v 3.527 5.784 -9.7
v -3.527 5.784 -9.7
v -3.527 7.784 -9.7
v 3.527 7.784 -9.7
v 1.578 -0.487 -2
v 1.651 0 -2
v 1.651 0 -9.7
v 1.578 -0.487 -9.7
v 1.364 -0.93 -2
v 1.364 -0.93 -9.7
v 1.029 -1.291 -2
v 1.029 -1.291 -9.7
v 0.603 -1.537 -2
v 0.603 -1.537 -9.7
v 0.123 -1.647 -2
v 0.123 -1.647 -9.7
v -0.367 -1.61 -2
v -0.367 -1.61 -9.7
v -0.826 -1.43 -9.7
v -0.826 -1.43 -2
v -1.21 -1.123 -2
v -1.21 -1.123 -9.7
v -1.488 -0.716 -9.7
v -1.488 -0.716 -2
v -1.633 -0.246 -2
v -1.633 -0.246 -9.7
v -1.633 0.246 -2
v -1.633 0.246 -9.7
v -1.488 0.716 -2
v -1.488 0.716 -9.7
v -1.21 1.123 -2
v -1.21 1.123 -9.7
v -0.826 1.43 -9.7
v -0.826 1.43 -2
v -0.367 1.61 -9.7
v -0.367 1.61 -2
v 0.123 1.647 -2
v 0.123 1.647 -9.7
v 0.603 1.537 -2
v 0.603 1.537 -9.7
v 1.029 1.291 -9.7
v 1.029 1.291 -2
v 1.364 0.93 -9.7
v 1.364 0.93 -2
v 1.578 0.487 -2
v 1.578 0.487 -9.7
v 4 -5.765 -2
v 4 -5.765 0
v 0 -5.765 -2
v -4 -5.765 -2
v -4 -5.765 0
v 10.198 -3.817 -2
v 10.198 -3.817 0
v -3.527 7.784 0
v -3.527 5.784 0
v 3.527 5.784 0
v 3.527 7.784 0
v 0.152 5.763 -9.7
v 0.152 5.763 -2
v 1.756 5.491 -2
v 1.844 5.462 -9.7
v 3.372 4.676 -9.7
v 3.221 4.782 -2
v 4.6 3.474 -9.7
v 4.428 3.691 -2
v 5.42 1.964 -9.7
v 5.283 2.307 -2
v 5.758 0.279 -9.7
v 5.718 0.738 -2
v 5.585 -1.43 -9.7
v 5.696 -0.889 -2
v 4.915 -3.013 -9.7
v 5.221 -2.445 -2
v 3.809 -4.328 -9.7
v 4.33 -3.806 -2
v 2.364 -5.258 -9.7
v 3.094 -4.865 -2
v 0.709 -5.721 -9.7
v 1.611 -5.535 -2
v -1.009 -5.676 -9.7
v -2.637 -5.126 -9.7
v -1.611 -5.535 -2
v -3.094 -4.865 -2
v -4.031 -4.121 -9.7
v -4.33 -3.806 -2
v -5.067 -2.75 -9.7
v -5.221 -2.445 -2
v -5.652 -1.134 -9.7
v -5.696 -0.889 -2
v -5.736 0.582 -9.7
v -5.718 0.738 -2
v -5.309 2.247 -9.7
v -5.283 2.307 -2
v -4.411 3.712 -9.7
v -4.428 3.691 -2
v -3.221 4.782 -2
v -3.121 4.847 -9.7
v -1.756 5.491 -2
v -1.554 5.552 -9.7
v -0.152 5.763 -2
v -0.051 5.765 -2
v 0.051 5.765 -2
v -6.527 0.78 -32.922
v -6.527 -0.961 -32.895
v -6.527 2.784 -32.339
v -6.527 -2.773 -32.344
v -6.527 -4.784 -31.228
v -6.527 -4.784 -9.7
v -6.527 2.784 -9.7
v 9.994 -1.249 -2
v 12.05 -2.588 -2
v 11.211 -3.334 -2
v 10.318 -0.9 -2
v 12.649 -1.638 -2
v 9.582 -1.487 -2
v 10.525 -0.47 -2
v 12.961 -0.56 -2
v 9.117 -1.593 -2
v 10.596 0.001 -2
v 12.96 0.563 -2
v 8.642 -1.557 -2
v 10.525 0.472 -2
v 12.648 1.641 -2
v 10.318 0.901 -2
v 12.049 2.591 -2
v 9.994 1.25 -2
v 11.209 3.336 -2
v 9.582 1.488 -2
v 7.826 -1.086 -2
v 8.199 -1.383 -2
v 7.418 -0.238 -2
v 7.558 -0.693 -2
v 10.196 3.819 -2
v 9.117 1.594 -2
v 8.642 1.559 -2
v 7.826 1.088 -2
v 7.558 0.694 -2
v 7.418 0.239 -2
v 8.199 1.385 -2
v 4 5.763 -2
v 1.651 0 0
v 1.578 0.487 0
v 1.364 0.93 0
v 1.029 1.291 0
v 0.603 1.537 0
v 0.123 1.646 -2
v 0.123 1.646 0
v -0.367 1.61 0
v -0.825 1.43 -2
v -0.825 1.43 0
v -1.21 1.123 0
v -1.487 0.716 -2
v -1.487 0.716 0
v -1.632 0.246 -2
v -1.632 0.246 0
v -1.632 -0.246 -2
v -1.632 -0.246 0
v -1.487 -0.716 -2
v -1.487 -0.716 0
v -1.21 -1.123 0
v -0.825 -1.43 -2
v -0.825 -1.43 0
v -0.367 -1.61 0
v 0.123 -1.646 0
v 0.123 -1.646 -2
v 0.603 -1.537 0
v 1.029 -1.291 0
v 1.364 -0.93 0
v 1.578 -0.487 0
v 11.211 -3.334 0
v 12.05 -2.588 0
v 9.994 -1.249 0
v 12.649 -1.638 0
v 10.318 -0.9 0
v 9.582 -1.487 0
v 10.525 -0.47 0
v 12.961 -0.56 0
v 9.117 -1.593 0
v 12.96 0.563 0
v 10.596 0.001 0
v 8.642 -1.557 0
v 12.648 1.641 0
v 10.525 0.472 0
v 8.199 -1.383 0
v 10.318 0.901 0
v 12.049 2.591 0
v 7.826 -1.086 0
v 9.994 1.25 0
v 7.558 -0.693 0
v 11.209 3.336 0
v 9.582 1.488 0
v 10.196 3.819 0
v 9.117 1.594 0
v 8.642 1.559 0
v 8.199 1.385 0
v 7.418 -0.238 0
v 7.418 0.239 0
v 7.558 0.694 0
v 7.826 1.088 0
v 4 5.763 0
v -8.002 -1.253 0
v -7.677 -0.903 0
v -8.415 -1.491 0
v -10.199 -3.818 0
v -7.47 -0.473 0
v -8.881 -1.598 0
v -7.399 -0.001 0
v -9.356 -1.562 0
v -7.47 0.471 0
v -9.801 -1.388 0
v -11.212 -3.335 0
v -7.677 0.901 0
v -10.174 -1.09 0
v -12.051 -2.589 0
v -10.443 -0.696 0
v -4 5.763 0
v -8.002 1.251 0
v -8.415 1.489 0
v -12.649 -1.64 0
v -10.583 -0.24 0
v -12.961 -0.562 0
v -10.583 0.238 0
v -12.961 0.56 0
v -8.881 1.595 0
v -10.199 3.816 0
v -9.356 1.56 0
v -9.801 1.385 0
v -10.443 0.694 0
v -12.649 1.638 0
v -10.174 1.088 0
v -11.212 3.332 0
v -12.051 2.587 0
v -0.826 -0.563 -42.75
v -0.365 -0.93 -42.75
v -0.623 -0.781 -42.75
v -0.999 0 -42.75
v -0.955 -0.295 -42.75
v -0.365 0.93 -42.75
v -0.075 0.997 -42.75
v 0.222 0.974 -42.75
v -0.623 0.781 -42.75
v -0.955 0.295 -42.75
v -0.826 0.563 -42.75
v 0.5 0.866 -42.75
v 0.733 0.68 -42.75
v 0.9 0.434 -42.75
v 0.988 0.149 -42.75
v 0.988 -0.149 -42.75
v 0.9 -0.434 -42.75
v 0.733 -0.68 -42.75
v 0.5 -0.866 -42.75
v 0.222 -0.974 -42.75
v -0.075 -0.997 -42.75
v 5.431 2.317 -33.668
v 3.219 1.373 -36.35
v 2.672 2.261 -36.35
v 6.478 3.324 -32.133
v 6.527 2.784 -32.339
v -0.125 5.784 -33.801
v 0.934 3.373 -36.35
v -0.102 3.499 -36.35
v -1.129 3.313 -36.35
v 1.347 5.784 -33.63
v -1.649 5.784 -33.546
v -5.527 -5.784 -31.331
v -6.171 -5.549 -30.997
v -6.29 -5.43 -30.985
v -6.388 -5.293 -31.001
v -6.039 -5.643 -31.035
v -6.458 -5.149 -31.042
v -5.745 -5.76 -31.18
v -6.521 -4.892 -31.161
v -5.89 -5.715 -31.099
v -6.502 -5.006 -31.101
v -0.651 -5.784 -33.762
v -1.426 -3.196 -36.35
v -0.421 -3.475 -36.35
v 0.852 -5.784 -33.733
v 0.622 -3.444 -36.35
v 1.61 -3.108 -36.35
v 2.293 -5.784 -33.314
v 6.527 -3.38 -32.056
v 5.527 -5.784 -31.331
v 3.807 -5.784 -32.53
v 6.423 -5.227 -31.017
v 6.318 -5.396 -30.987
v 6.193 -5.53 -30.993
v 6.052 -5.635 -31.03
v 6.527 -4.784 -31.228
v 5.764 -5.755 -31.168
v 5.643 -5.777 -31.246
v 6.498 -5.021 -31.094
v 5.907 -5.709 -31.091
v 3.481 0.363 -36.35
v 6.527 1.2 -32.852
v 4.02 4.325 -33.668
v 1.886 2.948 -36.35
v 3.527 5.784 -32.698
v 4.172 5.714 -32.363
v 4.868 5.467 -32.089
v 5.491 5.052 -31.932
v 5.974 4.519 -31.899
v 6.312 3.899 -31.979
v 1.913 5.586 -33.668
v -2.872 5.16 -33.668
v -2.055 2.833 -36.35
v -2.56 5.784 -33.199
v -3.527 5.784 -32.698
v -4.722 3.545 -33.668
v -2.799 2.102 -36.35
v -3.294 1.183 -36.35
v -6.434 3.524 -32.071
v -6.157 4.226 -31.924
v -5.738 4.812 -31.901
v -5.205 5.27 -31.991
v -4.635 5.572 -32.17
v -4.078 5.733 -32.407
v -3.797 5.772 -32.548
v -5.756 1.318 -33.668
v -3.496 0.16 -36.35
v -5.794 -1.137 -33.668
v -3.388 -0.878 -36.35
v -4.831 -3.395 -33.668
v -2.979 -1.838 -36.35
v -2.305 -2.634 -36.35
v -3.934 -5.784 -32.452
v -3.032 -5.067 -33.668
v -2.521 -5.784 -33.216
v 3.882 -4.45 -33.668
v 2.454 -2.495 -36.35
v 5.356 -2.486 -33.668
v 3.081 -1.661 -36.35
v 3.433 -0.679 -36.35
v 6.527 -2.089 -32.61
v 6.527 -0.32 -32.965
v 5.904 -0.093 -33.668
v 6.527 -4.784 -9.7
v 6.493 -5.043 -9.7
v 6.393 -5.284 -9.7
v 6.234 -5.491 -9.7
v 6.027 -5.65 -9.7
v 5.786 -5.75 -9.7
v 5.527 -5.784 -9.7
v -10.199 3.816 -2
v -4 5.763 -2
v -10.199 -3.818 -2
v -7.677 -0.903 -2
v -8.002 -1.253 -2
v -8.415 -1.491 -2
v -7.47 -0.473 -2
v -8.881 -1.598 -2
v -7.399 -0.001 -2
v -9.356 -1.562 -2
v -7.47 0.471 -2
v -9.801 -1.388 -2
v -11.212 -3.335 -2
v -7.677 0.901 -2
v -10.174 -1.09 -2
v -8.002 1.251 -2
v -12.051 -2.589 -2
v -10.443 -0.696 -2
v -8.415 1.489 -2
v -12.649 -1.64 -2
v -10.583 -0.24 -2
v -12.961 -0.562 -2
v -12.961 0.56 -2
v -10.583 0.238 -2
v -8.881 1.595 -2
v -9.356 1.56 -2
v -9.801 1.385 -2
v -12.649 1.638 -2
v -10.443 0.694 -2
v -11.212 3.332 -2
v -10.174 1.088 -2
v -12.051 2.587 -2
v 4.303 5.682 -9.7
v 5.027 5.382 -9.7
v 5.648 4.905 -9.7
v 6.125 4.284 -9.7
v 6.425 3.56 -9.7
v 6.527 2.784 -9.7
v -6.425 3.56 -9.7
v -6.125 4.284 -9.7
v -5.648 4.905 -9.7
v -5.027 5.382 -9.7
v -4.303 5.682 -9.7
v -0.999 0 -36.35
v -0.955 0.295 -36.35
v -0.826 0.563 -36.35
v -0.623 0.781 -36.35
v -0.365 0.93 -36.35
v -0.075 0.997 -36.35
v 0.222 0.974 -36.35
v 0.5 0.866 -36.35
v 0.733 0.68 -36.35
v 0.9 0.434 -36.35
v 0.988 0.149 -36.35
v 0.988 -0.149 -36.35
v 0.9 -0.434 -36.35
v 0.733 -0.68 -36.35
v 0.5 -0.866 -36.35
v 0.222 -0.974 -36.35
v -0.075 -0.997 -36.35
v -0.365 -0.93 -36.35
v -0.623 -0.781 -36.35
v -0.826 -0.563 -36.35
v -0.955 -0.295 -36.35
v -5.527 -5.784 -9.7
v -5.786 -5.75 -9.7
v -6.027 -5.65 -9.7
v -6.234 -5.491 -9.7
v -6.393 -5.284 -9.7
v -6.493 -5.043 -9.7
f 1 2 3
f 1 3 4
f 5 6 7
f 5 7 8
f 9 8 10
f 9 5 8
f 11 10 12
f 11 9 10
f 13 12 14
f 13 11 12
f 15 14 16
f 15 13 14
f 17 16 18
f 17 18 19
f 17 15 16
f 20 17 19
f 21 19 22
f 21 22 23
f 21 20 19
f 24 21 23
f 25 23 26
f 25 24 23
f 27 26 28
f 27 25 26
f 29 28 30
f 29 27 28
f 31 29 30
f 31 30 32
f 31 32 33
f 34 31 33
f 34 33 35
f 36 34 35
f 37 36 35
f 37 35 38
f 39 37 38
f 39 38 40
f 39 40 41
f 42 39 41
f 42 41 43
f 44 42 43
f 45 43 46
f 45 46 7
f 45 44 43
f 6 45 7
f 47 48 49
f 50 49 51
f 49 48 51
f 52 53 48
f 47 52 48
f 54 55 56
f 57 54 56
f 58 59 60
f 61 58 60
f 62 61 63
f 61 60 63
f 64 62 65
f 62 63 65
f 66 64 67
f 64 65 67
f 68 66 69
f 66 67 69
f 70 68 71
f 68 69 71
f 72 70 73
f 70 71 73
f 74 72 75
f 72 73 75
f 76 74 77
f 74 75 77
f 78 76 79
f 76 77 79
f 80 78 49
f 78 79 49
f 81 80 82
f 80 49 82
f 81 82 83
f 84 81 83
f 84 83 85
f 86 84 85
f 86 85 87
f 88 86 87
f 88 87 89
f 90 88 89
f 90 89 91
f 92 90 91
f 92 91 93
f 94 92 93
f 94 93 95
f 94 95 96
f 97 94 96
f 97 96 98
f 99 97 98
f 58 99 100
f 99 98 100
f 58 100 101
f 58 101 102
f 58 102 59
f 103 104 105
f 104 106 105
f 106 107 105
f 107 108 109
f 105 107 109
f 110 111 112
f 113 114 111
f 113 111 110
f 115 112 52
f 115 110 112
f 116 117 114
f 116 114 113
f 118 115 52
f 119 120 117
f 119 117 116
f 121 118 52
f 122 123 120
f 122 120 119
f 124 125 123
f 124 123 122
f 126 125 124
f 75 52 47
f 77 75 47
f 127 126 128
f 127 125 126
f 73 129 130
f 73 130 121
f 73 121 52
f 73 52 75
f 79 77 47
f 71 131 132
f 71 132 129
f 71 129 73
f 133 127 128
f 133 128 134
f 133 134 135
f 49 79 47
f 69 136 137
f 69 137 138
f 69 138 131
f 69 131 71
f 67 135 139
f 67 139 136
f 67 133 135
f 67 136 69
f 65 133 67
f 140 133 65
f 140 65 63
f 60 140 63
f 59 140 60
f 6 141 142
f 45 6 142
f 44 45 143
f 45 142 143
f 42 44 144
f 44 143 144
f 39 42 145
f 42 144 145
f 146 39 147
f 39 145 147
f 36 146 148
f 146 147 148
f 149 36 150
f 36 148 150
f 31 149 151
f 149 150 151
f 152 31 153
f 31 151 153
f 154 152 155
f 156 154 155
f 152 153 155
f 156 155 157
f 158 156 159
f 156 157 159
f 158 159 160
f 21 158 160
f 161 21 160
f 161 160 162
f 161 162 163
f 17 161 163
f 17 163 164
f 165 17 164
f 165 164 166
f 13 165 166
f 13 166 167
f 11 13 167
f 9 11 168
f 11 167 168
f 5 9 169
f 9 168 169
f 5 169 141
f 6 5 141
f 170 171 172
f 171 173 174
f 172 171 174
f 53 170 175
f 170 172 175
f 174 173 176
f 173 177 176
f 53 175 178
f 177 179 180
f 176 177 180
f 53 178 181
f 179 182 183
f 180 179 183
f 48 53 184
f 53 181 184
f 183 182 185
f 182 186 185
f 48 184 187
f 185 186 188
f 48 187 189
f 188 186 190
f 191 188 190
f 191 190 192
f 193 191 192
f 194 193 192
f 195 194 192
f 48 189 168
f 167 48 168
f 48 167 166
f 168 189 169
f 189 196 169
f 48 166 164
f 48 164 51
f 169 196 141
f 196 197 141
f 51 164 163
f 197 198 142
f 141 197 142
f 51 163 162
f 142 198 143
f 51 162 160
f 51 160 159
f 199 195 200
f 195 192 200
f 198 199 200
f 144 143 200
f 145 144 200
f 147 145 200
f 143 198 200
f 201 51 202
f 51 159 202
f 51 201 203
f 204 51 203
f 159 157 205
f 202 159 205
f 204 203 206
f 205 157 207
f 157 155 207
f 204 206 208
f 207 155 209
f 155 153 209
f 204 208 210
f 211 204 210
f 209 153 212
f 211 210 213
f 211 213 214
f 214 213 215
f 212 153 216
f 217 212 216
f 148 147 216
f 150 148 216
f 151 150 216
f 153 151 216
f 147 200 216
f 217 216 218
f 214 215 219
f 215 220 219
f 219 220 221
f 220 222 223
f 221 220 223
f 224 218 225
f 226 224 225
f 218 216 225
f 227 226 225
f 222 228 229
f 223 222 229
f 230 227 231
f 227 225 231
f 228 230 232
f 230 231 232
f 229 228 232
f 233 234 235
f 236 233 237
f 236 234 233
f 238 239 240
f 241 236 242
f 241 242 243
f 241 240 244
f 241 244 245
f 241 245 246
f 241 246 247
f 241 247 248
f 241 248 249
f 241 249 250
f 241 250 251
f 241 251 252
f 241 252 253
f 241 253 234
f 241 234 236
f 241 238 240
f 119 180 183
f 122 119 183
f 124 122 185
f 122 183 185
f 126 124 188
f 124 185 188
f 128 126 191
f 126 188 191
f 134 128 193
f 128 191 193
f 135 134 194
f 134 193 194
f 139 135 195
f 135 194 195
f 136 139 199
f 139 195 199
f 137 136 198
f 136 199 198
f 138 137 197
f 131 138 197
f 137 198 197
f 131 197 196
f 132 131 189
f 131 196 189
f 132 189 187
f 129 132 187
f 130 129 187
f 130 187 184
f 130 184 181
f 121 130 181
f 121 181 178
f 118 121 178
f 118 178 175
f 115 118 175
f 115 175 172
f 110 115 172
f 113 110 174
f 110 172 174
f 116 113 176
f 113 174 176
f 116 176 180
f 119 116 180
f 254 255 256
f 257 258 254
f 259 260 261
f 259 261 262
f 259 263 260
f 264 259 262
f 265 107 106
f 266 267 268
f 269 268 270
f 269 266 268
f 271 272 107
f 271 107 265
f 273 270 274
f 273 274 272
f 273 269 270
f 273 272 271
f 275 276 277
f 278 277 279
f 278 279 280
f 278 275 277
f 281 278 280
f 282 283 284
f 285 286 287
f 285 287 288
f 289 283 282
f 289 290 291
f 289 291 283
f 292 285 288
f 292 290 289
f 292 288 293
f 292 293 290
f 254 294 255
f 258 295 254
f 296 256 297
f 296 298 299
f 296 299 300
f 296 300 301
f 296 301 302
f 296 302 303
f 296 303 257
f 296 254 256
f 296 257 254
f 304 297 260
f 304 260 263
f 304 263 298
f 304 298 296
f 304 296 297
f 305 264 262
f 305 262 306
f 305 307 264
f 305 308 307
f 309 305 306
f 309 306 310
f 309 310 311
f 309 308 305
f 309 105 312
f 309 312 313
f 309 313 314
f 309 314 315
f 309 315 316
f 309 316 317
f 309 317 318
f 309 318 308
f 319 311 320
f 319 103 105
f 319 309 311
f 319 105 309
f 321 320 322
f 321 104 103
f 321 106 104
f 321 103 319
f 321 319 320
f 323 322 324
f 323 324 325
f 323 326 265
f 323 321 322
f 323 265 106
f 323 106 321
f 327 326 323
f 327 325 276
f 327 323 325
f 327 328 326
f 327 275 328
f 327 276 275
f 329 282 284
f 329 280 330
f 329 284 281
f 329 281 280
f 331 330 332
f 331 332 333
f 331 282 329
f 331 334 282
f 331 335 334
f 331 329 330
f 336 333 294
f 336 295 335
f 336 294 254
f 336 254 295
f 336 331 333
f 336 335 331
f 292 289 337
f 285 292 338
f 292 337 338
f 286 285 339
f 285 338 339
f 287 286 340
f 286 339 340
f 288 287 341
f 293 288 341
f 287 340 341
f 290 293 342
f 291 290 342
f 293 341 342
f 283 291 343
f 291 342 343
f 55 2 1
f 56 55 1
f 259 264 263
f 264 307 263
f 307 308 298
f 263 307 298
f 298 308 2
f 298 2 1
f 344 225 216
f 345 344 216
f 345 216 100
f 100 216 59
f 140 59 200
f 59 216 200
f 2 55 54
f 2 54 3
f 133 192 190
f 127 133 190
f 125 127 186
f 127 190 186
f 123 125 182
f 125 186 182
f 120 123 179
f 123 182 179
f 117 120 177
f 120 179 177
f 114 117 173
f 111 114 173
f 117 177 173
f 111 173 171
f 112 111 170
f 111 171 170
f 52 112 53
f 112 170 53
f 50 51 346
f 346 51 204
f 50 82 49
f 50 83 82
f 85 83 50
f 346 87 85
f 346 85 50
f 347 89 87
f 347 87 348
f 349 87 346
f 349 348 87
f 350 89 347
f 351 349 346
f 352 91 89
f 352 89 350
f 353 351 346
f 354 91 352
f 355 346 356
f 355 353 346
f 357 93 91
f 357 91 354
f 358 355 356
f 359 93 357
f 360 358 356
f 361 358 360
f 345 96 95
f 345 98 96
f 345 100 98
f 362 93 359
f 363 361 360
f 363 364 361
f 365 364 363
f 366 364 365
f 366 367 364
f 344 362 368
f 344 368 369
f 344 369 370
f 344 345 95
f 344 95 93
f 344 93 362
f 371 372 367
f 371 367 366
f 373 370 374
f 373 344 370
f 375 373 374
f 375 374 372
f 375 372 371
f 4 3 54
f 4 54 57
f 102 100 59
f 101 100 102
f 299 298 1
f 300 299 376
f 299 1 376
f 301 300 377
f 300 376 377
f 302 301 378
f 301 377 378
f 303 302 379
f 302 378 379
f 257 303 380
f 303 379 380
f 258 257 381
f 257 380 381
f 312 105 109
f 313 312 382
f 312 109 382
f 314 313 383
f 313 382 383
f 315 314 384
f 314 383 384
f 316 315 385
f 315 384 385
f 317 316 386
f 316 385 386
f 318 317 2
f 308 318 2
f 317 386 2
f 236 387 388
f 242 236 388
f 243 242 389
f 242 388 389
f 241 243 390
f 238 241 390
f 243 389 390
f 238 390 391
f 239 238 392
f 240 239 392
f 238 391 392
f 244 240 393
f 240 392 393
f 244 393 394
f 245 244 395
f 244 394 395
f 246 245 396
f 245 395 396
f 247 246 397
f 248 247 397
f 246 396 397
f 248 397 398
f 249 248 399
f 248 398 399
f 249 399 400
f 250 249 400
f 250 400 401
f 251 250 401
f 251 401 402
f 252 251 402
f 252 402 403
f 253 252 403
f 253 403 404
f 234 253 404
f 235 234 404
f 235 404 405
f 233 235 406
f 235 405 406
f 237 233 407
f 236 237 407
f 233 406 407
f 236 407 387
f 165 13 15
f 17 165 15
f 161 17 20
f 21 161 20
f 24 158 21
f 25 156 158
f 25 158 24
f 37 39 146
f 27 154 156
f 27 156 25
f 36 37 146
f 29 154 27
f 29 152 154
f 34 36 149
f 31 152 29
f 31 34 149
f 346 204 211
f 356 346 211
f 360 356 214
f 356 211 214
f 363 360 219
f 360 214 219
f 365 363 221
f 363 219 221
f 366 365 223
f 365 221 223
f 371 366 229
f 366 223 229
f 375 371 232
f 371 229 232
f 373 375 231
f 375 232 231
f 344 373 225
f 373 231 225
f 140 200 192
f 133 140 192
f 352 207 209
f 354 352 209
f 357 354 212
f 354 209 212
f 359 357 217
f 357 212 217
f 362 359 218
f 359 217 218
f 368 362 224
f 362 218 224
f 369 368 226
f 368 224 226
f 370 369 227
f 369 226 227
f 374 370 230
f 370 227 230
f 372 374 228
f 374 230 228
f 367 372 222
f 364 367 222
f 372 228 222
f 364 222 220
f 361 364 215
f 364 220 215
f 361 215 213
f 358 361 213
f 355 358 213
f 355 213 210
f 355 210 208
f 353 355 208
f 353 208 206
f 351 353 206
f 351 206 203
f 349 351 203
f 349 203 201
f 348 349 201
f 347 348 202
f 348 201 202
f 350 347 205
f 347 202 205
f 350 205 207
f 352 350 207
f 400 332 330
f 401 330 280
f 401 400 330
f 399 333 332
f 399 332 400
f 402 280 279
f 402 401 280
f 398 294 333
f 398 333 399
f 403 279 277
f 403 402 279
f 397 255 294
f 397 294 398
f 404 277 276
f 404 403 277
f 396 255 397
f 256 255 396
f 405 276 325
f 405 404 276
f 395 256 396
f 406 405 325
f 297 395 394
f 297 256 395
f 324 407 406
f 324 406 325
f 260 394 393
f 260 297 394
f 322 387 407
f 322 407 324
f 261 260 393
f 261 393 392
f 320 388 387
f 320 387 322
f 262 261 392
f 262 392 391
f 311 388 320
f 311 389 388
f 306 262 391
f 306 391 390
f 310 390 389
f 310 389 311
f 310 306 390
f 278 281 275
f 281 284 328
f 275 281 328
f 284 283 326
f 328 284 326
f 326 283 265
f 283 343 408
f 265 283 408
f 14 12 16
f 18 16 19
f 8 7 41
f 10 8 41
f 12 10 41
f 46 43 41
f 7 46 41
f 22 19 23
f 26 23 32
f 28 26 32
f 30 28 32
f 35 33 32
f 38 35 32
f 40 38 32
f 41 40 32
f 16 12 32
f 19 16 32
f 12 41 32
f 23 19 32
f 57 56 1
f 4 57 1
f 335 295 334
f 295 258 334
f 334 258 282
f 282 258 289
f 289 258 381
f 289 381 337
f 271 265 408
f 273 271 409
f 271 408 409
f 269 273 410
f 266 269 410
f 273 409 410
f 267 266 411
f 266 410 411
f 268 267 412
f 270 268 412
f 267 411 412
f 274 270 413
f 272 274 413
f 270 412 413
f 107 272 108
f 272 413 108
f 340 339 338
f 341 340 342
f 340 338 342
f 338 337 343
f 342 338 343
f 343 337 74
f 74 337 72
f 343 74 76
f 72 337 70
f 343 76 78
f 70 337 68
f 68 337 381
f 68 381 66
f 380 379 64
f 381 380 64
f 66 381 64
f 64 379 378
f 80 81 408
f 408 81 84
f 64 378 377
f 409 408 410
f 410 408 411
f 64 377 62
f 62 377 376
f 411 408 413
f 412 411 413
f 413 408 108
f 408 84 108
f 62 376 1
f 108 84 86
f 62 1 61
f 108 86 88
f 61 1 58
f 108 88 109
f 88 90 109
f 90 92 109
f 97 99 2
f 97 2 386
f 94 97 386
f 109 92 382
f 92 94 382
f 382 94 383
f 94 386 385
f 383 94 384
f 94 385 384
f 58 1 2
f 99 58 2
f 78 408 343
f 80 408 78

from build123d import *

# Parameters (mm, degrees)
CROQUIS1_R               = 1.598160281
CROQUIS1_R_2             = 1.600993429
CROQUIS1_R_3             = 1.650918845
SALIENTE_EXTRUIR7_DEPTH  = 2
CROQUIS2_R               = 5.764999893
CROQUIS2_R_2             = 1.651186543
SALIENTE_EXTRUIR8_DEPTH  = 7.7
SALIENTE_EXTRUIR9_DEPTH  = 26.65
CROQUIS6_R               = 0.999415005
SALIENTE_EXTRUIR10_DEPTH = 6.4
CROQUIS7_W               = 7.053736916
CROQUIS7_H               = 9.7
SALIENTE_EXTRUIR11_DEPTH = 2


with BuildPart() as part:
    # Croquis1 → Saliente-Extruir7 (new body)
    with BuildSketch(Plane.XY):
        with BuildLine():
            Line((4.00000019, 5.763000809), (10.195969576, 3.8191034))
            ThreePointArc((10.195969576, 3.8191034), (12.999977706, 0.001566069), (10.197782, -3.817301838))
            Line((10.197782, -3.817301838), (4.00000019, -5.764999893))
            Line((4.00000019, -5.764999893), (-4.00000019, -5.764999893))
            Line((-4.00000019, -5.764999893), (-10.199065979, -3.817665654))
            ThreePointArc((-10.199065979, -3.817665654), (-13.000622723, -0.001109837), (-10.199143851, 3.815503142))
            Line((-10.199143851, 3.815503142), (-4.00000019, 5.763000809))
            Line((-4.00000019, 5.763000809), (4.00000019, 5.763000809))
        make_face()
        with Locations((8.997973452, 0.000616233)):
            Circle(CROQUIS1_R, mode=Mode.SUBTRACT)
        with Locations((-9.000145119, -0.001069025)):
            Circle(CROQUIS1_R_2, mode=Mode.SUBTRACT)
        Circle(CROQUIS1_R_3, mode=Mode.SUBTRACT)
    extrude(amount=-SALIENTE_EXTRUIR7_DEPTH)

    # Croquis2 → Saliente-Extruir8 (add)
    with BuildSketch(Plane(origin=(0, 0, -2), x_dir=(-1, 0, 0), z_dir=(0, 0, -1))):
        with Locations(Location((0, 0, 0), (0, 0, 91.508919394))):
            Circle(CROQUIS2_R)
        with Locations(Location((0, 0, 0), (0, 0, 180))):
            Circle(CROQUIS2_R_2, mode=Mode.SUBTRACT)
    extrude(amount=SALIENTE_EXTRUIR8_DEPTH)

    # Croquis3 → Saliente-Extruir9 (add)
    with BuildSketch(Plane(origin=(0, 0, -9.7), x_dir=(-1, 0, 0), z_dir=(0, 0, -1))):
        with BuildLine():
            Line((3.526868458, 5.783774708), (-3.526868458, 5.783774708))
            ThreePointArc((-3.526868458, 5.783774708), (-5.648188802, 4.905095052), (-6.526868458, 2.783774708))
            Line((-6.526868458, 2.783774708), (-6.526868458, -4.783774708))
            ThreePointArc((-6.526868458, -4.783774708), (-6.233975239, -5.490881489), (-5.526868458, -5.783774708))
            Line((-5.526868458, -5.783774708), (5.526868458, -5.783774708))
            ThreePointArc((5.526868458, -5.783774708), (6.233975239, -5.490881489), (6.526868458, -4.783774708))
            Line((6.526868458, -4.783774708), (6.526868458, 2.783774708))
            ThreePointArc((6.526868458, 2.783774708), (5.648188802, 4.905095052), (3.526868458, 5.783774708))
        make_face()
    extrude(amount=SALIENTE_EXTRUIR9_DEPTH)

    # Croquis5 → Cortar-Revolución1 (revolve, cut)
    with BuildSketch(Plane(origin=(0, 0, 0), x_dir=(1, 0, 0), z_dir=(0, 1, 0)), mode=Mode.PRIVATE) as cortar_revoluci_n1_sk:
        Polygon((-3.5, 36.35), (-8.472559386, 30.803521887), (-8.472559386, 36.35), align=None)
    revolve(cortar_revoluci_n1_sk.sketch.rotate(Axis((0, 0, -39.9199001), (0, 0, 1)), 203.098732749), axis=Axis((0, 0, -39.9199001), (0, 0, 1)), mode=Mode.SUBTRACT)

    # Croquis6 → Saliente-Extruir10 (add)
    with BuildSketch(Plane(origin=(0, 0, -36.35), x_dir=(-1, 0, 0), z_dir=(0, 0, -1))):
        Circle(CROQUIS6_R)
    extrude(amount=SALIENTE_EXTRUIR10_DEPTH)


with BuildPart() as body_2:
    # Croquis7 → Saliente-Extruir11 (new body)
    with BuildSketch(Plane(origin=(0, 5.783774708, 0), x_dir=(1, 0, 0), z_dir=(0, 1, 0))):
        with Locations((0, 4.85)):
            Rectangle(CROQUIS7_W, CROQUIS7_H)
    extrude(amount=SALIENTE_EXTRUIR11_DEPTH)


solid = Compound([part.part, body_2.part])
